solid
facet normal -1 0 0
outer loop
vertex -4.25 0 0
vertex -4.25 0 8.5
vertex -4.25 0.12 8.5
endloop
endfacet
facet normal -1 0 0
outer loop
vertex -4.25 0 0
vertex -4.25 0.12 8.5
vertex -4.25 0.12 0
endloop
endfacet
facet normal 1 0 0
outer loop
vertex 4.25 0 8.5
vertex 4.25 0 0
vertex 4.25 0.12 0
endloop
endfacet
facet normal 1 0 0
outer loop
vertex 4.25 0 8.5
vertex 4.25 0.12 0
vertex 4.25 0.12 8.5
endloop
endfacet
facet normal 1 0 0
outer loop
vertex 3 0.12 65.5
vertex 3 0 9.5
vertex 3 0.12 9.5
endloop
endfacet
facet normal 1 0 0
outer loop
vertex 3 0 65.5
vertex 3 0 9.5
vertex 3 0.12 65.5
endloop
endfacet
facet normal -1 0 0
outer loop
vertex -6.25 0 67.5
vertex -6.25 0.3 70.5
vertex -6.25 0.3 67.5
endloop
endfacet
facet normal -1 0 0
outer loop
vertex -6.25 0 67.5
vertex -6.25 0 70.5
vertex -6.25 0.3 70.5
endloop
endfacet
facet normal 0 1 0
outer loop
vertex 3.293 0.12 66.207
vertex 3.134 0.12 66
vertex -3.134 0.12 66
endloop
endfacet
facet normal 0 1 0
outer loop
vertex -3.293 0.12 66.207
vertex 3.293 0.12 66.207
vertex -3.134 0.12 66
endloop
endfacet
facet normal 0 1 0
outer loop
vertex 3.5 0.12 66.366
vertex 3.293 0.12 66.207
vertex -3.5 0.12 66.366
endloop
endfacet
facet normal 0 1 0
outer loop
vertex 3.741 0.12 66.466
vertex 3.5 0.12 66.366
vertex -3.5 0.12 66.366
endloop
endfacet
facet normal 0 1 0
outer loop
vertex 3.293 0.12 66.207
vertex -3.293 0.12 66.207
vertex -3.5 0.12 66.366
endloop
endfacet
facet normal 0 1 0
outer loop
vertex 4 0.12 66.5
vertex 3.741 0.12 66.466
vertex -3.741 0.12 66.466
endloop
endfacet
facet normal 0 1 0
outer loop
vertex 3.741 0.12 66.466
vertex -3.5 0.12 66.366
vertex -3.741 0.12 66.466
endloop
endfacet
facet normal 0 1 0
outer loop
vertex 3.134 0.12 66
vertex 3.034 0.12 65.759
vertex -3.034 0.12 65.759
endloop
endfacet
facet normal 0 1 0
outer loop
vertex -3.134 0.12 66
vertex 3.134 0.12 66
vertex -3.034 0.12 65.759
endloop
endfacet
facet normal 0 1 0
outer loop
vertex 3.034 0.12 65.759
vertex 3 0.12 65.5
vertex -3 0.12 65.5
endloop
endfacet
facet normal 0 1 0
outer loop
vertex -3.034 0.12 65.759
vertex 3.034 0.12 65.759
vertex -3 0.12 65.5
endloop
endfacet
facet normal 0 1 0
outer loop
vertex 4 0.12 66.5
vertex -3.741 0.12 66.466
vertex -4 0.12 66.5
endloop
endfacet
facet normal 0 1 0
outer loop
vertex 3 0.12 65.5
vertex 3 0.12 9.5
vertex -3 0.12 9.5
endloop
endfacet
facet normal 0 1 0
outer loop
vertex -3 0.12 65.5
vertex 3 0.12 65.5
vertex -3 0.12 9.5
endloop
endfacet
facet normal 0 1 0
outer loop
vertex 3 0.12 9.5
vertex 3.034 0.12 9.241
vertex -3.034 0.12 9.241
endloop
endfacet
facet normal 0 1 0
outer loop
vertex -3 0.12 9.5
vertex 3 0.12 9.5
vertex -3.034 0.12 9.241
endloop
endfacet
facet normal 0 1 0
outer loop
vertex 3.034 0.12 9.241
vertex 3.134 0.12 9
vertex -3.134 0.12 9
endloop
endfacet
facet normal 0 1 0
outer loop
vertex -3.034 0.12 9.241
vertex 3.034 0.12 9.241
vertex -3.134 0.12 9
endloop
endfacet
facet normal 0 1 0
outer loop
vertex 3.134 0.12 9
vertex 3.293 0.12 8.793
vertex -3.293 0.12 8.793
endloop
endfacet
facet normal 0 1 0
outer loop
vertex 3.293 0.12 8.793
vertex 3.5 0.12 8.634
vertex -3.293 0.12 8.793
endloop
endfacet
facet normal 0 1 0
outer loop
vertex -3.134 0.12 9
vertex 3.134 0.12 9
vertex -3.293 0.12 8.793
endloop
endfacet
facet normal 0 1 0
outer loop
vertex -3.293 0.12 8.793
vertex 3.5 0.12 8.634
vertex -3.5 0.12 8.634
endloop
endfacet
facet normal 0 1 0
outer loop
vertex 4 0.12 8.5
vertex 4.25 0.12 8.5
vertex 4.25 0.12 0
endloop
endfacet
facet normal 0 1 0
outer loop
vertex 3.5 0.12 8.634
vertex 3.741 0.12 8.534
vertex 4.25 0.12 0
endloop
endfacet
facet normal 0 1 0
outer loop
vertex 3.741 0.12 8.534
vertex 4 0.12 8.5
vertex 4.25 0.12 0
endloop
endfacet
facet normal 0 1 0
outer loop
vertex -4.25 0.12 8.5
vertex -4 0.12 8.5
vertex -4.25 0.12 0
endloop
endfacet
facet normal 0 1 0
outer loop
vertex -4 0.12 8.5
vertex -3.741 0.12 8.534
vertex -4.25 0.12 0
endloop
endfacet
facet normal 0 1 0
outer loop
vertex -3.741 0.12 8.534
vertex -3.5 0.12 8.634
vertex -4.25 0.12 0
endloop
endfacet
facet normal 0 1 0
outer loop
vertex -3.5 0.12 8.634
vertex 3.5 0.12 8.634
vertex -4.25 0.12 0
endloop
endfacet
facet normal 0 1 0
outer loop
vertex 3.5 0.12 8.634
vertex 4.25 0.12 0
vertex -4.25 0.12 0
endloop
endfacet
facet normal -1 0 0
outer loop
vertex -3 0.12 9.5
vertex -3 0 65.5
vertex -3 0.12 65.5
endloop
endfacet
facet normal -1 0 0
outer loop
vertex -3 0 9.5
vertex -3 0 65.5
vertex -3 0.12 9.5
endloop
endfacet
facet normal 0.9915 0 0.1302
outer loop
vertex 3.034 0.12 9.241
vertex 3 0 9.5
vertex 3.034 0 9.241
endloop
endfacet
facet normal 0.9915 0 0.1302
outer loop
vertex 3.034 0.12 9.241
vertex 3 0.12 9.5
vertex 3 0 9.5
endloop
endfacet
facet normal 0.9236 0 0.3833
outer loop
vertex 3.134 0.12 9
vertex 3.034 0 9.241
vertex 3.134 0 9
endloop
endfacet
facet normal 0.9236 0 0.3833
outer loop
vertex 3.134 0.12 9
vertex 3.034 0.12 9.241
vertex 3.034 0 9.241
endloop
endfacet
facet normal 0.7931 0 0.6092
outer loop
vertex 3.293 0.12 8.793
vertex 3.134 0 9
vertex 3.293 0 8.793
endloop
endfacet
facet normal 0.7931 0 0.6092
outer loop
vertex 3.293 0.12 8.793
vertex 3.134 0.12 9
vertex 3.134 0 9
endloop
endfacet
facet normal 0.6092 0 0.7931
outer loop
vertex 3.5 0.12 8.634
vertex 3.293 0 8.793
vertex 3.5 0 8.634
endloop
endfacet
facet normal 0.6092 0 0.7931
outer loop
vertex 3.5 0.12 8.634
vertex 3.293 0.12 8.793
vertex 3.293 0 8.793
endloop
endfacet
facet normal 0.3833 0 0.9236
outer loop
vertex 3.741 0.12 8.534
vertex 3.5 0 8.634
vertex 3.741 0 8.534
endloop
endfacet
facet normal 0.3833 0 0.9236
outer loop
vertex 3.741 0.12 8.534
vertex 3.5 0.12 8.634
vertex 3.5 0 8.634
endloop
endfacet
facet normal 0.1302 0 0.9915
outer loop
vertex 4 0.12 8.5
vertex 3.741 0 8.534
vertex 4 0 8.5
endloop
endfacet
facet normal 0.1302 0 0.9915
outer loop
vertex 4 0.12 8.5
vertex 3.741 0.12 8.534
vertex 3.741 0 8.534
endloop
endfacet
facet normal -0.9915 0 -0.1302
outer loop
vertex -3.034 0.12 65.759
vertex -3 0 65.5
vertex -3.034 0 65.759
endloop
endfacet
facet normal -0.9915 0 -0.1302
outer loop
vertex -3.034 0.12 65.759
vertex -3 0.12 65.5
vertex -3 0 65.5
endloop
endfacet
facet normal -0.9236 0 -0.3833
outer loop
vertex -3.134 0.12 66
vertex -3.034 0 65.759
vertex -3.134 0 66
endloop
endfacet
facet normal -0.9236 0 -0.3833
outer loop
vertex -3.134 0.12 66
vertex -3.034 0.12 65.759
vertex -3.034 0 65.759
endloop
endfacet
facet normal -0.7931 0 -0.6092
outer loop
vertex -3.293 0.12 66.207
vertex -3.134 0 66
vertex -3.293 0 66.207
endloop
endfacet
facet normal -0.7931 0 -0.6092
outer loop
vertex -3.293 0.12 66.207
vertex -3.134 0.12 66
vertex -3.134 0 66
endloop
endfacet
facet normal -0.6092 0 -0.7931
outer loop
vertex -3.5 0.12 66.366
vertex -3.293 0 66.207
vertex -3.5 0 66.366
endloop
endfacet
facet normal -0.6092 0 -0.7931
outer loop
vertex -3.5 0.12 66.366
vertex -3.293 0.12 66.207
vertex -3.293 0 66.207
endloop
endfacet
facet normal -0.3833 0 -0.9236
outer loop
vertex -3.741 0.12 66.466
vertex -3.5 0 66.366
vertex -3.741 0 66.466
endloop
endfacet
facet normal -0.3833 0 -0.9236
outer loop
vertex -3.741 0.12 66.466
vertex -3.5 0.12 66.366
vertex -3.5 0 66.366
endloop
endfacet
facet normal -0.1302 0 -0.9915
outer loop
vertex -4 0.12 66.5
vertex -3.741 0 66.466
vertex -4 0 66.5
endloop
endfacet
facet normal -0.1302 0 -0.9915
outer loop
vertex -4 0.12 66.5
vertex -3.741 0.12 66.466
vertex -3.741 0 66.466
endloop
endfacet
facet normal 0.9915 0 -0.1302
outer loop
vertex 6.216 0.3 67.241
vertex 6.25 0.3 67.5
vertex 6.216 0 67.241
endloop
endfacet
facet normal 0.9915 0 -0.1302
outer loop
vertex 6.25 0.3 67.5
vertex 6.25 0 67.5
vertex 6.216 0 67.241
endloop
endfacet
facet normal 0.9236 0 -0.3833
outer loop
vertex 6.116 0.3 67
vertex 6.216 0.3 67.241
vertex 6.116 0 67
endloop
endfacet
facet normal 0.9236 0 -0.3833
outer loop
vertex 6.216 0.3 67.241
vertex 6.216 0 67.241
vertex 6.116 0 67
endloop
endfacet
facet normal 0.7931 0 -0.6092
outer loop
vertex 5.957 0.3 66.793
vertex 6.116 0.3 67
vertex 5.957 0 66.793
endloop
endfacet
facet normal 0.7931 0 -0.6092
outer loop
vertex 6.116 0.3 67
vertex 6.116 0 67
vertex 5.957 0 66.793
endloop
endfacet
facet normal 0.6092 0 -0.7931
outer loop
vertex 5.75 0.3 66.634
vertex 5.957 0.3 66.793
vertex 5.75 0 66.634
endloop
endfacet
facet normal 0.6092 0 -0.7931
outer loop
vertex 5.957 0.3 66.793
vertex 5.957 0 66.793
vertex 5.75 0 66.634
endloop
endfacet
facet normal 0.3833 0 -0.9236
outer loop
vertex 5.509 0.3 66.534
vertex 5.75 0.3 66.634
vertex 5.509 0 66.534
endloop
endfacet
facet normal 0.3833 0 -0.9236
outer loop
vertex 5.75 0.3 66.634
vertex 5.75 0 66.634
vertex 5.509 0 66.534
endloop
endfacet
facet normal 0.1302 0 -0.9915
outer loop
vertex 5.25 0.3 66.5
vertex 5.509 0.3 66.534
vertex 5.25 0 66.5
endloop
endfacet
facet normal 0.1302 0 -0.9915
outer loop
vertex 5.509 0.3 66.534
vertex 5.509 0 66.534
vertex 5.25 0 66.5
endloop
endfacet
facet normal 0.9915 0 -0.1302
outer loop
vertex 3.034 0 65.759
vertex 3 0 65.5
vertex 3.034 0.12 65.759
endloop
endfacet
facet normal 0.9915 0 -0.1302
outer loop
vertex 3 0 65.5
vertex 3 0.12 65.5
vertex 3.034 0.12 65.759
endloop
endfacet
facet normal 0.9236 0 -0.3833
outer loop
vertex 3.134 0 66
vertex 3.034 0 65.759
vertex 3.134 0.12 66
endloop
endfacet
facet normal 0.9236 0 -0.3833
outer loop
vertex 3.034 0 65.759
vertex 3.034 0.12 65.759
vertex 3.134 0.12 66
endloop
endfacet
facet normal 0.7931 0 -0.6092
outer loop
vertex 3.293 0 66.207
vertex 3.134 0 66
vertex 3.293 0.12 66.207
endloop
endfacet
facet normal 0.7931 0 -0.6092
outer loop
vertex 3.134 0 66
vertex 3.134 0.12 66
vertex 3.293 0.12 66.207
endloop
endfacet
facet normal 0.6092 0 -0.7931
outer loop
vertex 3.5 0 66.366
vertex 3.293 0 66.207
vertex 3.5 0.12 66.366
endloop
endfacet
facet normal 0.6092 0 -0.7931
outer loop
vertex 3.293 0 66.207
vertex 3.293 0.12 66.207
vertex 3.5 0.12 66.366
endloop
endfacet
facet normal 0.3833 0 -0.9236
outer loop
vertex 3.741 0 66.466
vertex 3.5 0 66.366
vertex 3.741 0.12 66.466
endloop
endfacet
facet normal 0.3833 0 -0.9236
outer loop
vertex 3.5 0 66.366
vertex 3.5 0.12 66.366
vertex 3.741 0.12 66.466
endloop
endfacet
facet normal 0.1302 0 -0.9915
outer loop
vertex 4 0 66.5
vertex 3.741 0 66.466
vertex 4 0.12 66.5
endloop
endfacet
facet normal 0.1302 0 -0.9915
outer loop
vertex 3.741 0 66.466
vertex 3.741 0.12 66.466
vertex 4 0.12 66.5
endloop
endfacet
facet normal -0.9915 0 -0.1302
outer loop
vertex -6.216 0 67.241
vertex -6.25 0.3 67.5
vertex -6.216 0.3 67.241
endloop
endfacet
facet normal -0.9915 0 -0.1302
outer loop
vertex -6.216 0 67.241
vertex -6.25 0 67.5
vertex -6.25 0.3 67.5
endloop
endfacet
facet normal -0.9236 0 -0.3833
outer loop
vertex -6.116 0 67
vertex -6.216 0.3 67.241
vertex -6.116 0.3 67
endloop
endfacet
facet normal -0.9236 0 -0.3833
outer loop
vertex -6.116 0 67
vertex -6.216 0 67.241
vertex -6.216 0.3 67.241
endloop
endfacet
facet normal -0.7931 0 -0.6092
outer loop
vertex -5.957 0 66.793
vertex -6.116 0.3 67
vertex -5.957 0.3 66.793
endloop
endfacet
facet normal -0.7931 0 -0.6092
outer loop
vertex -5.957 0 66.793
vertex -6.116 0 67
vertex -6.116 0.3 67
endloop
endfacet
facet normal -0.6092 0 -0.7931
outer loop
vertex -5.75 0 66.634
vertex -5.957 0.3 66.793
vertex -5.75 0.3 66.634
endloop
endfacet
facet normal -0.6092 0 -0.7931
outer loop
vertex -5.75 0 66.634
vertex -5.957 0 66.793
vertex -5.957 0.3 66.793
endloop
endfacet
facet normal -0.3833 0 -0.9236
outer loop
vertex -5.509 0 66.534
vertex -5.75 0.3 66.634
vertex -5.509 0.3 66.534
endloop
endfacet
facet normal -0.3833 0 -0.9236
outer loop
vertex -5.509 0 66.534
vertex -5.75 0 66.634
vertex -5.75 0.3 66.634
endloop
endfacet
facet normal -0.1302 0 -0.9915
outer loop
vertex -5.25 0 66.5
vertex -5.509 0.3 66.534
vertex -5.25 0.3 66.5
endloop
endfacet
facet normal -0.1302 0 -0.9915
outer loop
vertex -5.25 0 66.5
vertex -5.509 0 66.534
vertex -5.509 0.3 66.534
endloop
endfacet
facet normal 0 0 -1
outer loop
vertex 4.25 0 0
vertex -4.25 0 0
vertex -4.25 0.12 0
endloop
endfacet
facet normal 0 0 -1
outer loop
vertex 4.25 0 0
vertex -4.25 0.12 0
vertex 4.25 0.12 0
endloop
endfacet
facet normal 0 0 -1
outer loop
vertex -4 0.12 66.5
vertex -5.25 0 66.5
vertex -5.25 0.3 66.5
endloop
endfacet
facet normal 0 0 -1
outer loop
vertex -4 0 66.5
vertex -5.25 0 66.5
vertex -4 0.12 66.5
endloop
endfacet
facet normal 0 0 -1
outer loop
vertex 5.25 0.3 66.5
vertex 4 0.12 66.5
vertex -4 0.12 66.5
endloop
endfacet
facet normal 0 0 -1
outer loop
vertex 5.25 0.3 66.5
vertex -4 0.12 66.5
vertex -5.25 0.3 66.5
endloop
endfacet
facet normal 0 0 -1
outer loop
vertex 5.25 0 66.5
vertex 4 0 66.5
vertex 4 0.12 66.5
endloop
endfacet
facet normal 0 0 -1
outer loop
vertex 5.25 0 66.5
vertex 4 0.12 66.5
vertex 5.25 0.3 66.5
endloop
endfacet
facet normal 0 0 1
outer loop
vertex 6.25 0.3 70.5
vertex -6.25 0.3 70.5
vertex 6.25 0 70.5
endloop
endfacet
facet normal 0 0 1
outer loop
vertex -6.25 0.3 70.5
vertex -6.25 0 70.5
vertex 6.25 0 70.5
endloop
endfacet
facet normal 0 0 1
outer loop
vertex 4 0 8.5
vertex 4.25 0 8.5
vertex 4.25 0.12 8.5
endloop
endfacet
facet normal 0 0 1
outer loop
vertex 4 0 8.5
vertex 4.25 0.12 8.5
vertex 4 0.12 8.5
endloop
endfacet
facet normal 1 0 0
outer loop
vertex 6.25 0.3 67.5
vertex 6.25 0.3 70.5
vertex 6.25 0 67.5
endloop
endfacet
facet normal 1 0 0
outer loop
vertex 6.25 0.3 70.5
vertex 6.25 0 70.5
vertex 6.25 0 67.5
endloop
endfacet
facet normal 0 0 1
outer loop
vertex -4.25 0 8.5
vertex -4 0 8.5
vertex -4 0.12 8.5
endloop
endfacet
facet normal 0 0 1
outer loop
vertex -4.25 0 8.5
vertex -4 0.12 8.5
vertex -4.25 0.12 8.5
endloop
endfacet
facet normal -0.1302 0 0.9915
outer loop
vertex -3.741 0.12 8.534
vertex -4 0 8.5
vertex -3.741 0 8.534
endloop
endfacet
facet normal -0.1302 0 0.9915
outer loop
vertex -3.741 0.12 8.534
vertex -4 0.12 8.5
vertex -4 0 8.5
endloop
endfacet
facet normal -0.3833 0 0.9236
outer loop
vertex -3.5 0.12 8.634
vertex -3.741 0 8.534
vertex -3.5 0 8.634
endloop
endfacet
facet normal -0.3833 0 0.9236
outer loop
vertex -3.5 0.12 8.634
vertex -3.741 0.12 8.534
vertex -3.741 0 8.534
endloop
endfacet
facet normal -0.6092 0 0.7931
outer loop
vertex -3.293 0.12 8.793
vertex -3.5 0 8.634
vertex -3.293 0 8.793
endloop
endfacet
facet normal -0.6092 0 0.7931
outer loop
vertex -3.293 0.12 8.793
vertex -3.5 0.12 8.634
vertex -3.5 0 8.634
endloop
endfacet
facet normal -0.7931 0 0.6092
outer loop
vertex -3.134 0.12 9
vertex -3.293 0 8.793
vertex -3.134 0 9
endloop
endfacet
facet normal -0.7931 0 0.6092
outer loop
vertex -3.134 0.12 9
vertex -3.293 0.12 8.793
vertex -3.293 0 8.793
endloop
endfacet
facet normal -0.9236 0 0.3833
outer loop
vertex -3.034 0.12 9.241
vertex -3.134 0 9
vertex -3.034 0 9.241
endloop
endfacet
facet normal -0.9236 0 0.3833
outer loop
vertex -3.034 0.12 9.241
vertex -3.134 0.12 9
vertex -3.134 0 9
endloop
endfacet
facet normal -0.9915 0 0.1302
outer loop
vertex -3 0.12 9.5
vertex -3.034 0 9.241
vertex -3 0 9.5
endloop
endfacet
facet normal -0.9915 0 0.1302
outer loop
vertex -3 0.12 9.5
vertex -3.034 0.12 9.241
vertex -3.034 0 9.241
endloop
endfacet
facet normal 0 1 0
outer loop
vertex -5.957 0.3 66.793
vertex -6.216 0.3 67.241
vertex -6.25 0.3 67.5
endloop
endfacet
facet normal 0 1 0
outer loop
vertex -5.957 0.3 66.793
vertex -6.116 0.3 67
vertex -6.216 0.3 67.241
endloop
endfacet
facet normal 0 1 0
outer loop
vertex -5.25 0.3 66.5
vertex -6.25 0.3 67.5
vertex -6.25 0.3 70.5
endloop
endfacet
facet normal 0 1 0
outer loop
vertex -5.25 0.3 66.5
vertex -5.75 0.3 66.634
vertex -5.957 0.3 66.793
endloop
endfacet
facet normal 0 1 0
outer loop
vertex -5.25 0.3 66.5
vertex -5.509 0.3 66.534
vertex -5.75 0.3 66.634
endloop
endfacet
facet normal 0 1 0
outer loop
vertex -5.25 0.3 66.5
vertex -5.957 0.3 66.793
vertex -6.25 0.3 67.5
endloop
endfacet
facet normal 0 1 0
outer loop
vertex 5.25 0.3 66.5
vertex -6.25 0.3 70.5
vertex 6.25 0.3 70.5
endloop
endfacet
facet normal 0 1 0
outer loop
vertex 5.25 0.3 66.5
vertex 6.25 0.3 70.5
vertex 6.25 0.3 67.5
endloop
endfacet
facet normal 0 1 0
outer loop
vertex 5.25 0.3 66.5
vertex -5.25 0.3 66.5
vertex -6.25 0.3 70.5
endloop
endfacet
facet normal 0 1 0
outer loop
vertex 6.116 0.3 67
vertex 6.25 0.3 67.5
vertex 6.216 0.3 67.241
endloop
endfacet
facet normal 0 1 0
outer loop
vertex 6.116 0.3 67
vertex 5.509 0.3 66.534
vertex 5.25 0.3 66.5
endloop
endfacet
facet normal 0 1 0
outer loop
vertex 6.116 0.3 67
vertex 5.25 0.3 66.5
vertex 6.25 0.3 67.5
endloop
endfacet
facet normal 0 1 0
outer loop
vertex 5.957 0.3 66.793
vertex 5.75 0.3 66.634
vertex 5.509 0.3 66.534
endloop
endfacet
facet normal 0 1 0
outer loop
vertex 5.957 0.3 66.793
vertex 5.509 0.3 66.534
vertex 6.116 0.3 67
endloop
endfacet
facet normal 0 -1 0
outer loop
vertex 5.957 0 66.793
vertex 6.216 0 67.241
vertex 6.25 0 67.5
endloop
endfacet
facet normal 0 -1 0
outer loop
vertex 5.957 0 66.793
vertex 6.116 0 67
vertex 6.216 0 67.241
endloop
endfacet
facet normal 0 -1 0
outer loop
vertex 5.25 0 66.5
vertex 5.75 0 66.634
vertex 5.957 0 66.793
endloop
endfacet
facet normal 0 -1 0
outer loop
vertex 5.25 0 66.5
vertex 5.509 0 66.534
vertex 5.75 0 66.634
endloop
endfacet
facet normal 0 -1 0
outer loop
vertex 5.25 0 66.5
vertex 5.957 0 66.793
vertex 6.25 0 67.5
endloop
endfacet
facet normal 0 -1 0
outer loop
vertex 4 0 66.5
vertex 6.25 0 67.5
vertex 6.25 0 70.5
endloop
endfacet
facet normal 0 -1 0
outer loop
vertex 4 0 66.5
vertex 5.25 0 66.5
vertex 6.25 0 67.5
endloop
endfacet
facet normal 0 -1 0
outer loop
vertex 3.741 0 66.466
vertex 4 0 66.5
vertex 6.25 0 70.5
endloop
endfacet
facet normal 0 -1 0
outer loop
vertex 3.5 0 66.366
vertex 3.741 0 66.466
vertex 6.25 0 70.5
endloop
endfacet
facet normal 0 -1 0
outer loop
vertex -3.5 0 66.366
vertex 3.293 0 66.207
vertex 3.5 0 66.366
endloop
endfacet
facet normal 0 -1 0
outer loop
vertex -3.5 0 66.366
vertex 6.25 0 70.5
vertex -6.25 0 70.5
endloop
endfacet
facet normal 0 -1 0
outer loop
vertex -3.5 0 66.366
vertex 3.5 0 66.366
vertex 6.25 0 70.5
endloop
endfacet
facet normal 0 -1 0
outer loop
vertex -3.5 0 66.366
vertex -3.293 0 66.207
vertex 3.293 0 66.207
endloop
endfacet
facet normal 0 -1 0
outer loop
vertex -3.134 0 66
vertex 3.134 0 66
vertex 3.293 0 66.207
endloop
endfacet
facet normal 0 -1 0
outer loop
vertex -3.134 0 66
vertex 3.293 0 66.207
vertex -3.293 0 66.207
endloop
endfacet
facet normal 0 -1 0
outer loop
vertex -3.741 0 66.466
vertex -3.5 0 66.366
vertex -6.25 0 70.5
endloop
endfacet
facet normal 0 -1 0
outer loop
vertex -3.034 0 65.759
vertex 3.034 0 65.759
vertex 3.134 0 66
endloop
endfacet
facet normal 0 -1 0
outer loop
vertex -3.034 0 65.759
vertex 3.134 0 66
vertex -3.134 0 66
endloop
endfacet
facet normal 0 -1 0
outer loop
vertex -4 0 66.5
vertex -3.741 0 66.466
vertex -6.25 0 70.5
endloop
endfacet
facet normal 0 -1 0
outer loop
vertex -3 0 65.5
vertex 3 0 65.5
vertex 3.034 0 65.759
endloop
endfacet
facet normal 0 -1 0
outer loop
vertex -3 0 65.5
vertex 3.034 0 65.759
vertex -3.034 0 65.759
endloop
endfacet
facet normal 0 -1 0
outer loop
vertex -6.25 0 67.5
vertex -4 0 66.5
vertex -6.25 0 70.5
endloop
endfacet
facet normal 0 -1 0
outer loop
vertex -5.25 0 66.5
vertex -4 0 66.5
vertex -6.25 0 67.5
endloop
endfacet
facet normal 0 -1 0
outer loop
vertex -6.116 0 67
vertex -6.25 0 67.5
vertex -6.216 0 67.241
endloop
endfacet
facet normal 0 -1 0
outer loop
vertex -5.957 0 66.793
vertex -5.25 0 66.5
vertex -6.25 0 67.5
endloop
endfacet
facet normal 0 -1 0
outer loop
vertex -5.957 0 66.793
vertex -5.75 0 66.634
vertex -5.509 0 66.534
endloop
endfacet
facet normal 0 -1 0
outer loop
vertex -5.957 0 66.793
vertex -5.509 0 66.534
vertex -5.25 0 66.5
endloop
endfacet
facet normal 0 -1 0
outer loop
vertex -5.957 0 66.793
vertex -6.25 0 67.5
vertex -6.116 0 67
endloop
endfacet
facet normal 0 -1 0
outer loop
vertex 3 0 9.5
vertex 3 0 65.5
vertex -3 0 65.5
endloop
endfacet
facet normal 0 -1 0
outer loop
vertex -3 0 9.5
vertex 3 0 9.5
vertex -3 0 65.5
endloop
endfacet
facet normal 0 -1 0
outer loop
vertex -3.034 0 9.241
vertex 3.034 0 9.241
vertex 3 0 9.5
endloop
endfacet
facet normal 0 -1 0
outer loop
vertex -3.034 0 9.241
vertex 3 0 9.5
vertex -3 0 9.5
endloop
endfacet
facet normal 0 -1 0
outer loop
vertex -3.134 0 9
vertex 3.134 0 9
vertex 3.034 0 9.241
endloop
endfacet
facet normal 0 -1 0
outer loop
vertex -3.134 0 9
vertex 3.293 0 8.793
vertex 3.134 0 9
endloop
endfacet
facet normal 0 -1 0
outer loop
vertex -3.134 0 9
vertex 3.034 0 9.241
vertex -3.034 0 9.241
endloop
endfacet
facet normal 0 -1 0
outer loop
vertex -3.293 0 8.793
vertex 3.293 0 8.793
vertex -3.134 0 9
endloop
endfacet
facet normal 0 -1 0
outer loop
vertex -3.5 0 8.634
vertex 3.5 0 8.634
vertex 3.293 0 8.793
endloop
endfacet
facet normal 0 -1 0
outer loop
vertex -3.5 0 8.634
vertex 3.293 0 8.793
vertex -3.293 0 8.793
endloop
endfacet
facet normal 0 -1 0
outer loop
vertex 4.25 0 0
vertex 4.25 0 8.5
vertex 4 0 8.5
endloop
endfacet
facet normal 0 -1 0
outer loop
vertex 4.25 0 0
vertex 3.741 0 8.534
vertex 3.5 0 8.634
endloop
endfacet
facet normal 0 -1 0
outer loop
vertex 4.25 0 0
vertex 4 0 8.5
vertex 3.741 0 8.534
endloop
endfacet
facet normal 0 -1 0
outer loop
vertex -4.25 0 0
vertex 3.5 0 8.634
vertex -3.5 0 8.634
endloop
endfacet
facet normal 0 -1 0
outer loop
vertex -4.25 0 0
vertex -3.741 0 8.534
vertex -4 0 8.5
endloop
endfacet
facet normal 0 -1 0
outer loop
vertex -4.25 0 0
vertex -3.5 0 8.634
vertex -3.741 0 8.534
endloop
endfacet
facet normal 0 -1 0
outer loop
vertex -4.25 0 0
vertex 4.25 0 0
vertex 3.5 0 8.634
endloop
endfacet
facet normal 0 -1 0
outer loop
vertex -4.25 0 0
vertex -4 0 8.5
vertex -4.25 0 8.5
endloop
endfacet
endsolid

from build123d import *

# Parameters (mm, degrees)
BOSS_EXTRUDE1_DEPTH = 0.12
SKETCH2_W           = 12.5
SKETCH2_H           = 4
BOSS_EXTRUDE2_DEPTH = 0.18
FILLET1_R           = 1


with BuildPart() as part:
    # Sketch1 → Boss-Extrude1 (new body)
    with BuildSketch(Plane(origin=(0, 0, 0), x_dir=(1, 0, 0), z_dir=(0, 1, 0))):
        Polygon((-4.25, 0), (4.25, 0), (4.25, -8.5), (3, -8.5), (3, -66.5), (6.25, -66.5), (6.25, -70.5), (-6.25, -70.5), (-6.25, -66.5), (-3, -66.5), (-3, -8.5), (-4.25, -8.5), align=None)
    extrude(amount=BOSS_EXTRUDE1_DEPTH)

    # Sketch2 → Boss-Extrude2 (add)
    with BuildSketch(Plane(origin=(0, 0.12, 0), x_dir=(1, 0, 0), z_dir=(0, 1, 0))):
        with Locations((0, -68.5)):
            Rectangle(SKETCH2_W, SKETCH2_H)
    extrude(amount=BOSS_EXTRUDE2_DEPTH)

    # Fillet1
    fillet1_edges = [part.edges().sort_by_distance(p)[0] for p in [
        (3, 0.06, 8.5),
        (3, 0.06, 66.5),
        (6.25, 0.15, 66.5),
        (-6.25, 0.15, 66.5),
        (-3, 0.06, 66.5),
        (-3, 0.06, 8.5),
    ]]
    fillet(fillet1_edges, radius=FILLET1_R)


solid = part.part
